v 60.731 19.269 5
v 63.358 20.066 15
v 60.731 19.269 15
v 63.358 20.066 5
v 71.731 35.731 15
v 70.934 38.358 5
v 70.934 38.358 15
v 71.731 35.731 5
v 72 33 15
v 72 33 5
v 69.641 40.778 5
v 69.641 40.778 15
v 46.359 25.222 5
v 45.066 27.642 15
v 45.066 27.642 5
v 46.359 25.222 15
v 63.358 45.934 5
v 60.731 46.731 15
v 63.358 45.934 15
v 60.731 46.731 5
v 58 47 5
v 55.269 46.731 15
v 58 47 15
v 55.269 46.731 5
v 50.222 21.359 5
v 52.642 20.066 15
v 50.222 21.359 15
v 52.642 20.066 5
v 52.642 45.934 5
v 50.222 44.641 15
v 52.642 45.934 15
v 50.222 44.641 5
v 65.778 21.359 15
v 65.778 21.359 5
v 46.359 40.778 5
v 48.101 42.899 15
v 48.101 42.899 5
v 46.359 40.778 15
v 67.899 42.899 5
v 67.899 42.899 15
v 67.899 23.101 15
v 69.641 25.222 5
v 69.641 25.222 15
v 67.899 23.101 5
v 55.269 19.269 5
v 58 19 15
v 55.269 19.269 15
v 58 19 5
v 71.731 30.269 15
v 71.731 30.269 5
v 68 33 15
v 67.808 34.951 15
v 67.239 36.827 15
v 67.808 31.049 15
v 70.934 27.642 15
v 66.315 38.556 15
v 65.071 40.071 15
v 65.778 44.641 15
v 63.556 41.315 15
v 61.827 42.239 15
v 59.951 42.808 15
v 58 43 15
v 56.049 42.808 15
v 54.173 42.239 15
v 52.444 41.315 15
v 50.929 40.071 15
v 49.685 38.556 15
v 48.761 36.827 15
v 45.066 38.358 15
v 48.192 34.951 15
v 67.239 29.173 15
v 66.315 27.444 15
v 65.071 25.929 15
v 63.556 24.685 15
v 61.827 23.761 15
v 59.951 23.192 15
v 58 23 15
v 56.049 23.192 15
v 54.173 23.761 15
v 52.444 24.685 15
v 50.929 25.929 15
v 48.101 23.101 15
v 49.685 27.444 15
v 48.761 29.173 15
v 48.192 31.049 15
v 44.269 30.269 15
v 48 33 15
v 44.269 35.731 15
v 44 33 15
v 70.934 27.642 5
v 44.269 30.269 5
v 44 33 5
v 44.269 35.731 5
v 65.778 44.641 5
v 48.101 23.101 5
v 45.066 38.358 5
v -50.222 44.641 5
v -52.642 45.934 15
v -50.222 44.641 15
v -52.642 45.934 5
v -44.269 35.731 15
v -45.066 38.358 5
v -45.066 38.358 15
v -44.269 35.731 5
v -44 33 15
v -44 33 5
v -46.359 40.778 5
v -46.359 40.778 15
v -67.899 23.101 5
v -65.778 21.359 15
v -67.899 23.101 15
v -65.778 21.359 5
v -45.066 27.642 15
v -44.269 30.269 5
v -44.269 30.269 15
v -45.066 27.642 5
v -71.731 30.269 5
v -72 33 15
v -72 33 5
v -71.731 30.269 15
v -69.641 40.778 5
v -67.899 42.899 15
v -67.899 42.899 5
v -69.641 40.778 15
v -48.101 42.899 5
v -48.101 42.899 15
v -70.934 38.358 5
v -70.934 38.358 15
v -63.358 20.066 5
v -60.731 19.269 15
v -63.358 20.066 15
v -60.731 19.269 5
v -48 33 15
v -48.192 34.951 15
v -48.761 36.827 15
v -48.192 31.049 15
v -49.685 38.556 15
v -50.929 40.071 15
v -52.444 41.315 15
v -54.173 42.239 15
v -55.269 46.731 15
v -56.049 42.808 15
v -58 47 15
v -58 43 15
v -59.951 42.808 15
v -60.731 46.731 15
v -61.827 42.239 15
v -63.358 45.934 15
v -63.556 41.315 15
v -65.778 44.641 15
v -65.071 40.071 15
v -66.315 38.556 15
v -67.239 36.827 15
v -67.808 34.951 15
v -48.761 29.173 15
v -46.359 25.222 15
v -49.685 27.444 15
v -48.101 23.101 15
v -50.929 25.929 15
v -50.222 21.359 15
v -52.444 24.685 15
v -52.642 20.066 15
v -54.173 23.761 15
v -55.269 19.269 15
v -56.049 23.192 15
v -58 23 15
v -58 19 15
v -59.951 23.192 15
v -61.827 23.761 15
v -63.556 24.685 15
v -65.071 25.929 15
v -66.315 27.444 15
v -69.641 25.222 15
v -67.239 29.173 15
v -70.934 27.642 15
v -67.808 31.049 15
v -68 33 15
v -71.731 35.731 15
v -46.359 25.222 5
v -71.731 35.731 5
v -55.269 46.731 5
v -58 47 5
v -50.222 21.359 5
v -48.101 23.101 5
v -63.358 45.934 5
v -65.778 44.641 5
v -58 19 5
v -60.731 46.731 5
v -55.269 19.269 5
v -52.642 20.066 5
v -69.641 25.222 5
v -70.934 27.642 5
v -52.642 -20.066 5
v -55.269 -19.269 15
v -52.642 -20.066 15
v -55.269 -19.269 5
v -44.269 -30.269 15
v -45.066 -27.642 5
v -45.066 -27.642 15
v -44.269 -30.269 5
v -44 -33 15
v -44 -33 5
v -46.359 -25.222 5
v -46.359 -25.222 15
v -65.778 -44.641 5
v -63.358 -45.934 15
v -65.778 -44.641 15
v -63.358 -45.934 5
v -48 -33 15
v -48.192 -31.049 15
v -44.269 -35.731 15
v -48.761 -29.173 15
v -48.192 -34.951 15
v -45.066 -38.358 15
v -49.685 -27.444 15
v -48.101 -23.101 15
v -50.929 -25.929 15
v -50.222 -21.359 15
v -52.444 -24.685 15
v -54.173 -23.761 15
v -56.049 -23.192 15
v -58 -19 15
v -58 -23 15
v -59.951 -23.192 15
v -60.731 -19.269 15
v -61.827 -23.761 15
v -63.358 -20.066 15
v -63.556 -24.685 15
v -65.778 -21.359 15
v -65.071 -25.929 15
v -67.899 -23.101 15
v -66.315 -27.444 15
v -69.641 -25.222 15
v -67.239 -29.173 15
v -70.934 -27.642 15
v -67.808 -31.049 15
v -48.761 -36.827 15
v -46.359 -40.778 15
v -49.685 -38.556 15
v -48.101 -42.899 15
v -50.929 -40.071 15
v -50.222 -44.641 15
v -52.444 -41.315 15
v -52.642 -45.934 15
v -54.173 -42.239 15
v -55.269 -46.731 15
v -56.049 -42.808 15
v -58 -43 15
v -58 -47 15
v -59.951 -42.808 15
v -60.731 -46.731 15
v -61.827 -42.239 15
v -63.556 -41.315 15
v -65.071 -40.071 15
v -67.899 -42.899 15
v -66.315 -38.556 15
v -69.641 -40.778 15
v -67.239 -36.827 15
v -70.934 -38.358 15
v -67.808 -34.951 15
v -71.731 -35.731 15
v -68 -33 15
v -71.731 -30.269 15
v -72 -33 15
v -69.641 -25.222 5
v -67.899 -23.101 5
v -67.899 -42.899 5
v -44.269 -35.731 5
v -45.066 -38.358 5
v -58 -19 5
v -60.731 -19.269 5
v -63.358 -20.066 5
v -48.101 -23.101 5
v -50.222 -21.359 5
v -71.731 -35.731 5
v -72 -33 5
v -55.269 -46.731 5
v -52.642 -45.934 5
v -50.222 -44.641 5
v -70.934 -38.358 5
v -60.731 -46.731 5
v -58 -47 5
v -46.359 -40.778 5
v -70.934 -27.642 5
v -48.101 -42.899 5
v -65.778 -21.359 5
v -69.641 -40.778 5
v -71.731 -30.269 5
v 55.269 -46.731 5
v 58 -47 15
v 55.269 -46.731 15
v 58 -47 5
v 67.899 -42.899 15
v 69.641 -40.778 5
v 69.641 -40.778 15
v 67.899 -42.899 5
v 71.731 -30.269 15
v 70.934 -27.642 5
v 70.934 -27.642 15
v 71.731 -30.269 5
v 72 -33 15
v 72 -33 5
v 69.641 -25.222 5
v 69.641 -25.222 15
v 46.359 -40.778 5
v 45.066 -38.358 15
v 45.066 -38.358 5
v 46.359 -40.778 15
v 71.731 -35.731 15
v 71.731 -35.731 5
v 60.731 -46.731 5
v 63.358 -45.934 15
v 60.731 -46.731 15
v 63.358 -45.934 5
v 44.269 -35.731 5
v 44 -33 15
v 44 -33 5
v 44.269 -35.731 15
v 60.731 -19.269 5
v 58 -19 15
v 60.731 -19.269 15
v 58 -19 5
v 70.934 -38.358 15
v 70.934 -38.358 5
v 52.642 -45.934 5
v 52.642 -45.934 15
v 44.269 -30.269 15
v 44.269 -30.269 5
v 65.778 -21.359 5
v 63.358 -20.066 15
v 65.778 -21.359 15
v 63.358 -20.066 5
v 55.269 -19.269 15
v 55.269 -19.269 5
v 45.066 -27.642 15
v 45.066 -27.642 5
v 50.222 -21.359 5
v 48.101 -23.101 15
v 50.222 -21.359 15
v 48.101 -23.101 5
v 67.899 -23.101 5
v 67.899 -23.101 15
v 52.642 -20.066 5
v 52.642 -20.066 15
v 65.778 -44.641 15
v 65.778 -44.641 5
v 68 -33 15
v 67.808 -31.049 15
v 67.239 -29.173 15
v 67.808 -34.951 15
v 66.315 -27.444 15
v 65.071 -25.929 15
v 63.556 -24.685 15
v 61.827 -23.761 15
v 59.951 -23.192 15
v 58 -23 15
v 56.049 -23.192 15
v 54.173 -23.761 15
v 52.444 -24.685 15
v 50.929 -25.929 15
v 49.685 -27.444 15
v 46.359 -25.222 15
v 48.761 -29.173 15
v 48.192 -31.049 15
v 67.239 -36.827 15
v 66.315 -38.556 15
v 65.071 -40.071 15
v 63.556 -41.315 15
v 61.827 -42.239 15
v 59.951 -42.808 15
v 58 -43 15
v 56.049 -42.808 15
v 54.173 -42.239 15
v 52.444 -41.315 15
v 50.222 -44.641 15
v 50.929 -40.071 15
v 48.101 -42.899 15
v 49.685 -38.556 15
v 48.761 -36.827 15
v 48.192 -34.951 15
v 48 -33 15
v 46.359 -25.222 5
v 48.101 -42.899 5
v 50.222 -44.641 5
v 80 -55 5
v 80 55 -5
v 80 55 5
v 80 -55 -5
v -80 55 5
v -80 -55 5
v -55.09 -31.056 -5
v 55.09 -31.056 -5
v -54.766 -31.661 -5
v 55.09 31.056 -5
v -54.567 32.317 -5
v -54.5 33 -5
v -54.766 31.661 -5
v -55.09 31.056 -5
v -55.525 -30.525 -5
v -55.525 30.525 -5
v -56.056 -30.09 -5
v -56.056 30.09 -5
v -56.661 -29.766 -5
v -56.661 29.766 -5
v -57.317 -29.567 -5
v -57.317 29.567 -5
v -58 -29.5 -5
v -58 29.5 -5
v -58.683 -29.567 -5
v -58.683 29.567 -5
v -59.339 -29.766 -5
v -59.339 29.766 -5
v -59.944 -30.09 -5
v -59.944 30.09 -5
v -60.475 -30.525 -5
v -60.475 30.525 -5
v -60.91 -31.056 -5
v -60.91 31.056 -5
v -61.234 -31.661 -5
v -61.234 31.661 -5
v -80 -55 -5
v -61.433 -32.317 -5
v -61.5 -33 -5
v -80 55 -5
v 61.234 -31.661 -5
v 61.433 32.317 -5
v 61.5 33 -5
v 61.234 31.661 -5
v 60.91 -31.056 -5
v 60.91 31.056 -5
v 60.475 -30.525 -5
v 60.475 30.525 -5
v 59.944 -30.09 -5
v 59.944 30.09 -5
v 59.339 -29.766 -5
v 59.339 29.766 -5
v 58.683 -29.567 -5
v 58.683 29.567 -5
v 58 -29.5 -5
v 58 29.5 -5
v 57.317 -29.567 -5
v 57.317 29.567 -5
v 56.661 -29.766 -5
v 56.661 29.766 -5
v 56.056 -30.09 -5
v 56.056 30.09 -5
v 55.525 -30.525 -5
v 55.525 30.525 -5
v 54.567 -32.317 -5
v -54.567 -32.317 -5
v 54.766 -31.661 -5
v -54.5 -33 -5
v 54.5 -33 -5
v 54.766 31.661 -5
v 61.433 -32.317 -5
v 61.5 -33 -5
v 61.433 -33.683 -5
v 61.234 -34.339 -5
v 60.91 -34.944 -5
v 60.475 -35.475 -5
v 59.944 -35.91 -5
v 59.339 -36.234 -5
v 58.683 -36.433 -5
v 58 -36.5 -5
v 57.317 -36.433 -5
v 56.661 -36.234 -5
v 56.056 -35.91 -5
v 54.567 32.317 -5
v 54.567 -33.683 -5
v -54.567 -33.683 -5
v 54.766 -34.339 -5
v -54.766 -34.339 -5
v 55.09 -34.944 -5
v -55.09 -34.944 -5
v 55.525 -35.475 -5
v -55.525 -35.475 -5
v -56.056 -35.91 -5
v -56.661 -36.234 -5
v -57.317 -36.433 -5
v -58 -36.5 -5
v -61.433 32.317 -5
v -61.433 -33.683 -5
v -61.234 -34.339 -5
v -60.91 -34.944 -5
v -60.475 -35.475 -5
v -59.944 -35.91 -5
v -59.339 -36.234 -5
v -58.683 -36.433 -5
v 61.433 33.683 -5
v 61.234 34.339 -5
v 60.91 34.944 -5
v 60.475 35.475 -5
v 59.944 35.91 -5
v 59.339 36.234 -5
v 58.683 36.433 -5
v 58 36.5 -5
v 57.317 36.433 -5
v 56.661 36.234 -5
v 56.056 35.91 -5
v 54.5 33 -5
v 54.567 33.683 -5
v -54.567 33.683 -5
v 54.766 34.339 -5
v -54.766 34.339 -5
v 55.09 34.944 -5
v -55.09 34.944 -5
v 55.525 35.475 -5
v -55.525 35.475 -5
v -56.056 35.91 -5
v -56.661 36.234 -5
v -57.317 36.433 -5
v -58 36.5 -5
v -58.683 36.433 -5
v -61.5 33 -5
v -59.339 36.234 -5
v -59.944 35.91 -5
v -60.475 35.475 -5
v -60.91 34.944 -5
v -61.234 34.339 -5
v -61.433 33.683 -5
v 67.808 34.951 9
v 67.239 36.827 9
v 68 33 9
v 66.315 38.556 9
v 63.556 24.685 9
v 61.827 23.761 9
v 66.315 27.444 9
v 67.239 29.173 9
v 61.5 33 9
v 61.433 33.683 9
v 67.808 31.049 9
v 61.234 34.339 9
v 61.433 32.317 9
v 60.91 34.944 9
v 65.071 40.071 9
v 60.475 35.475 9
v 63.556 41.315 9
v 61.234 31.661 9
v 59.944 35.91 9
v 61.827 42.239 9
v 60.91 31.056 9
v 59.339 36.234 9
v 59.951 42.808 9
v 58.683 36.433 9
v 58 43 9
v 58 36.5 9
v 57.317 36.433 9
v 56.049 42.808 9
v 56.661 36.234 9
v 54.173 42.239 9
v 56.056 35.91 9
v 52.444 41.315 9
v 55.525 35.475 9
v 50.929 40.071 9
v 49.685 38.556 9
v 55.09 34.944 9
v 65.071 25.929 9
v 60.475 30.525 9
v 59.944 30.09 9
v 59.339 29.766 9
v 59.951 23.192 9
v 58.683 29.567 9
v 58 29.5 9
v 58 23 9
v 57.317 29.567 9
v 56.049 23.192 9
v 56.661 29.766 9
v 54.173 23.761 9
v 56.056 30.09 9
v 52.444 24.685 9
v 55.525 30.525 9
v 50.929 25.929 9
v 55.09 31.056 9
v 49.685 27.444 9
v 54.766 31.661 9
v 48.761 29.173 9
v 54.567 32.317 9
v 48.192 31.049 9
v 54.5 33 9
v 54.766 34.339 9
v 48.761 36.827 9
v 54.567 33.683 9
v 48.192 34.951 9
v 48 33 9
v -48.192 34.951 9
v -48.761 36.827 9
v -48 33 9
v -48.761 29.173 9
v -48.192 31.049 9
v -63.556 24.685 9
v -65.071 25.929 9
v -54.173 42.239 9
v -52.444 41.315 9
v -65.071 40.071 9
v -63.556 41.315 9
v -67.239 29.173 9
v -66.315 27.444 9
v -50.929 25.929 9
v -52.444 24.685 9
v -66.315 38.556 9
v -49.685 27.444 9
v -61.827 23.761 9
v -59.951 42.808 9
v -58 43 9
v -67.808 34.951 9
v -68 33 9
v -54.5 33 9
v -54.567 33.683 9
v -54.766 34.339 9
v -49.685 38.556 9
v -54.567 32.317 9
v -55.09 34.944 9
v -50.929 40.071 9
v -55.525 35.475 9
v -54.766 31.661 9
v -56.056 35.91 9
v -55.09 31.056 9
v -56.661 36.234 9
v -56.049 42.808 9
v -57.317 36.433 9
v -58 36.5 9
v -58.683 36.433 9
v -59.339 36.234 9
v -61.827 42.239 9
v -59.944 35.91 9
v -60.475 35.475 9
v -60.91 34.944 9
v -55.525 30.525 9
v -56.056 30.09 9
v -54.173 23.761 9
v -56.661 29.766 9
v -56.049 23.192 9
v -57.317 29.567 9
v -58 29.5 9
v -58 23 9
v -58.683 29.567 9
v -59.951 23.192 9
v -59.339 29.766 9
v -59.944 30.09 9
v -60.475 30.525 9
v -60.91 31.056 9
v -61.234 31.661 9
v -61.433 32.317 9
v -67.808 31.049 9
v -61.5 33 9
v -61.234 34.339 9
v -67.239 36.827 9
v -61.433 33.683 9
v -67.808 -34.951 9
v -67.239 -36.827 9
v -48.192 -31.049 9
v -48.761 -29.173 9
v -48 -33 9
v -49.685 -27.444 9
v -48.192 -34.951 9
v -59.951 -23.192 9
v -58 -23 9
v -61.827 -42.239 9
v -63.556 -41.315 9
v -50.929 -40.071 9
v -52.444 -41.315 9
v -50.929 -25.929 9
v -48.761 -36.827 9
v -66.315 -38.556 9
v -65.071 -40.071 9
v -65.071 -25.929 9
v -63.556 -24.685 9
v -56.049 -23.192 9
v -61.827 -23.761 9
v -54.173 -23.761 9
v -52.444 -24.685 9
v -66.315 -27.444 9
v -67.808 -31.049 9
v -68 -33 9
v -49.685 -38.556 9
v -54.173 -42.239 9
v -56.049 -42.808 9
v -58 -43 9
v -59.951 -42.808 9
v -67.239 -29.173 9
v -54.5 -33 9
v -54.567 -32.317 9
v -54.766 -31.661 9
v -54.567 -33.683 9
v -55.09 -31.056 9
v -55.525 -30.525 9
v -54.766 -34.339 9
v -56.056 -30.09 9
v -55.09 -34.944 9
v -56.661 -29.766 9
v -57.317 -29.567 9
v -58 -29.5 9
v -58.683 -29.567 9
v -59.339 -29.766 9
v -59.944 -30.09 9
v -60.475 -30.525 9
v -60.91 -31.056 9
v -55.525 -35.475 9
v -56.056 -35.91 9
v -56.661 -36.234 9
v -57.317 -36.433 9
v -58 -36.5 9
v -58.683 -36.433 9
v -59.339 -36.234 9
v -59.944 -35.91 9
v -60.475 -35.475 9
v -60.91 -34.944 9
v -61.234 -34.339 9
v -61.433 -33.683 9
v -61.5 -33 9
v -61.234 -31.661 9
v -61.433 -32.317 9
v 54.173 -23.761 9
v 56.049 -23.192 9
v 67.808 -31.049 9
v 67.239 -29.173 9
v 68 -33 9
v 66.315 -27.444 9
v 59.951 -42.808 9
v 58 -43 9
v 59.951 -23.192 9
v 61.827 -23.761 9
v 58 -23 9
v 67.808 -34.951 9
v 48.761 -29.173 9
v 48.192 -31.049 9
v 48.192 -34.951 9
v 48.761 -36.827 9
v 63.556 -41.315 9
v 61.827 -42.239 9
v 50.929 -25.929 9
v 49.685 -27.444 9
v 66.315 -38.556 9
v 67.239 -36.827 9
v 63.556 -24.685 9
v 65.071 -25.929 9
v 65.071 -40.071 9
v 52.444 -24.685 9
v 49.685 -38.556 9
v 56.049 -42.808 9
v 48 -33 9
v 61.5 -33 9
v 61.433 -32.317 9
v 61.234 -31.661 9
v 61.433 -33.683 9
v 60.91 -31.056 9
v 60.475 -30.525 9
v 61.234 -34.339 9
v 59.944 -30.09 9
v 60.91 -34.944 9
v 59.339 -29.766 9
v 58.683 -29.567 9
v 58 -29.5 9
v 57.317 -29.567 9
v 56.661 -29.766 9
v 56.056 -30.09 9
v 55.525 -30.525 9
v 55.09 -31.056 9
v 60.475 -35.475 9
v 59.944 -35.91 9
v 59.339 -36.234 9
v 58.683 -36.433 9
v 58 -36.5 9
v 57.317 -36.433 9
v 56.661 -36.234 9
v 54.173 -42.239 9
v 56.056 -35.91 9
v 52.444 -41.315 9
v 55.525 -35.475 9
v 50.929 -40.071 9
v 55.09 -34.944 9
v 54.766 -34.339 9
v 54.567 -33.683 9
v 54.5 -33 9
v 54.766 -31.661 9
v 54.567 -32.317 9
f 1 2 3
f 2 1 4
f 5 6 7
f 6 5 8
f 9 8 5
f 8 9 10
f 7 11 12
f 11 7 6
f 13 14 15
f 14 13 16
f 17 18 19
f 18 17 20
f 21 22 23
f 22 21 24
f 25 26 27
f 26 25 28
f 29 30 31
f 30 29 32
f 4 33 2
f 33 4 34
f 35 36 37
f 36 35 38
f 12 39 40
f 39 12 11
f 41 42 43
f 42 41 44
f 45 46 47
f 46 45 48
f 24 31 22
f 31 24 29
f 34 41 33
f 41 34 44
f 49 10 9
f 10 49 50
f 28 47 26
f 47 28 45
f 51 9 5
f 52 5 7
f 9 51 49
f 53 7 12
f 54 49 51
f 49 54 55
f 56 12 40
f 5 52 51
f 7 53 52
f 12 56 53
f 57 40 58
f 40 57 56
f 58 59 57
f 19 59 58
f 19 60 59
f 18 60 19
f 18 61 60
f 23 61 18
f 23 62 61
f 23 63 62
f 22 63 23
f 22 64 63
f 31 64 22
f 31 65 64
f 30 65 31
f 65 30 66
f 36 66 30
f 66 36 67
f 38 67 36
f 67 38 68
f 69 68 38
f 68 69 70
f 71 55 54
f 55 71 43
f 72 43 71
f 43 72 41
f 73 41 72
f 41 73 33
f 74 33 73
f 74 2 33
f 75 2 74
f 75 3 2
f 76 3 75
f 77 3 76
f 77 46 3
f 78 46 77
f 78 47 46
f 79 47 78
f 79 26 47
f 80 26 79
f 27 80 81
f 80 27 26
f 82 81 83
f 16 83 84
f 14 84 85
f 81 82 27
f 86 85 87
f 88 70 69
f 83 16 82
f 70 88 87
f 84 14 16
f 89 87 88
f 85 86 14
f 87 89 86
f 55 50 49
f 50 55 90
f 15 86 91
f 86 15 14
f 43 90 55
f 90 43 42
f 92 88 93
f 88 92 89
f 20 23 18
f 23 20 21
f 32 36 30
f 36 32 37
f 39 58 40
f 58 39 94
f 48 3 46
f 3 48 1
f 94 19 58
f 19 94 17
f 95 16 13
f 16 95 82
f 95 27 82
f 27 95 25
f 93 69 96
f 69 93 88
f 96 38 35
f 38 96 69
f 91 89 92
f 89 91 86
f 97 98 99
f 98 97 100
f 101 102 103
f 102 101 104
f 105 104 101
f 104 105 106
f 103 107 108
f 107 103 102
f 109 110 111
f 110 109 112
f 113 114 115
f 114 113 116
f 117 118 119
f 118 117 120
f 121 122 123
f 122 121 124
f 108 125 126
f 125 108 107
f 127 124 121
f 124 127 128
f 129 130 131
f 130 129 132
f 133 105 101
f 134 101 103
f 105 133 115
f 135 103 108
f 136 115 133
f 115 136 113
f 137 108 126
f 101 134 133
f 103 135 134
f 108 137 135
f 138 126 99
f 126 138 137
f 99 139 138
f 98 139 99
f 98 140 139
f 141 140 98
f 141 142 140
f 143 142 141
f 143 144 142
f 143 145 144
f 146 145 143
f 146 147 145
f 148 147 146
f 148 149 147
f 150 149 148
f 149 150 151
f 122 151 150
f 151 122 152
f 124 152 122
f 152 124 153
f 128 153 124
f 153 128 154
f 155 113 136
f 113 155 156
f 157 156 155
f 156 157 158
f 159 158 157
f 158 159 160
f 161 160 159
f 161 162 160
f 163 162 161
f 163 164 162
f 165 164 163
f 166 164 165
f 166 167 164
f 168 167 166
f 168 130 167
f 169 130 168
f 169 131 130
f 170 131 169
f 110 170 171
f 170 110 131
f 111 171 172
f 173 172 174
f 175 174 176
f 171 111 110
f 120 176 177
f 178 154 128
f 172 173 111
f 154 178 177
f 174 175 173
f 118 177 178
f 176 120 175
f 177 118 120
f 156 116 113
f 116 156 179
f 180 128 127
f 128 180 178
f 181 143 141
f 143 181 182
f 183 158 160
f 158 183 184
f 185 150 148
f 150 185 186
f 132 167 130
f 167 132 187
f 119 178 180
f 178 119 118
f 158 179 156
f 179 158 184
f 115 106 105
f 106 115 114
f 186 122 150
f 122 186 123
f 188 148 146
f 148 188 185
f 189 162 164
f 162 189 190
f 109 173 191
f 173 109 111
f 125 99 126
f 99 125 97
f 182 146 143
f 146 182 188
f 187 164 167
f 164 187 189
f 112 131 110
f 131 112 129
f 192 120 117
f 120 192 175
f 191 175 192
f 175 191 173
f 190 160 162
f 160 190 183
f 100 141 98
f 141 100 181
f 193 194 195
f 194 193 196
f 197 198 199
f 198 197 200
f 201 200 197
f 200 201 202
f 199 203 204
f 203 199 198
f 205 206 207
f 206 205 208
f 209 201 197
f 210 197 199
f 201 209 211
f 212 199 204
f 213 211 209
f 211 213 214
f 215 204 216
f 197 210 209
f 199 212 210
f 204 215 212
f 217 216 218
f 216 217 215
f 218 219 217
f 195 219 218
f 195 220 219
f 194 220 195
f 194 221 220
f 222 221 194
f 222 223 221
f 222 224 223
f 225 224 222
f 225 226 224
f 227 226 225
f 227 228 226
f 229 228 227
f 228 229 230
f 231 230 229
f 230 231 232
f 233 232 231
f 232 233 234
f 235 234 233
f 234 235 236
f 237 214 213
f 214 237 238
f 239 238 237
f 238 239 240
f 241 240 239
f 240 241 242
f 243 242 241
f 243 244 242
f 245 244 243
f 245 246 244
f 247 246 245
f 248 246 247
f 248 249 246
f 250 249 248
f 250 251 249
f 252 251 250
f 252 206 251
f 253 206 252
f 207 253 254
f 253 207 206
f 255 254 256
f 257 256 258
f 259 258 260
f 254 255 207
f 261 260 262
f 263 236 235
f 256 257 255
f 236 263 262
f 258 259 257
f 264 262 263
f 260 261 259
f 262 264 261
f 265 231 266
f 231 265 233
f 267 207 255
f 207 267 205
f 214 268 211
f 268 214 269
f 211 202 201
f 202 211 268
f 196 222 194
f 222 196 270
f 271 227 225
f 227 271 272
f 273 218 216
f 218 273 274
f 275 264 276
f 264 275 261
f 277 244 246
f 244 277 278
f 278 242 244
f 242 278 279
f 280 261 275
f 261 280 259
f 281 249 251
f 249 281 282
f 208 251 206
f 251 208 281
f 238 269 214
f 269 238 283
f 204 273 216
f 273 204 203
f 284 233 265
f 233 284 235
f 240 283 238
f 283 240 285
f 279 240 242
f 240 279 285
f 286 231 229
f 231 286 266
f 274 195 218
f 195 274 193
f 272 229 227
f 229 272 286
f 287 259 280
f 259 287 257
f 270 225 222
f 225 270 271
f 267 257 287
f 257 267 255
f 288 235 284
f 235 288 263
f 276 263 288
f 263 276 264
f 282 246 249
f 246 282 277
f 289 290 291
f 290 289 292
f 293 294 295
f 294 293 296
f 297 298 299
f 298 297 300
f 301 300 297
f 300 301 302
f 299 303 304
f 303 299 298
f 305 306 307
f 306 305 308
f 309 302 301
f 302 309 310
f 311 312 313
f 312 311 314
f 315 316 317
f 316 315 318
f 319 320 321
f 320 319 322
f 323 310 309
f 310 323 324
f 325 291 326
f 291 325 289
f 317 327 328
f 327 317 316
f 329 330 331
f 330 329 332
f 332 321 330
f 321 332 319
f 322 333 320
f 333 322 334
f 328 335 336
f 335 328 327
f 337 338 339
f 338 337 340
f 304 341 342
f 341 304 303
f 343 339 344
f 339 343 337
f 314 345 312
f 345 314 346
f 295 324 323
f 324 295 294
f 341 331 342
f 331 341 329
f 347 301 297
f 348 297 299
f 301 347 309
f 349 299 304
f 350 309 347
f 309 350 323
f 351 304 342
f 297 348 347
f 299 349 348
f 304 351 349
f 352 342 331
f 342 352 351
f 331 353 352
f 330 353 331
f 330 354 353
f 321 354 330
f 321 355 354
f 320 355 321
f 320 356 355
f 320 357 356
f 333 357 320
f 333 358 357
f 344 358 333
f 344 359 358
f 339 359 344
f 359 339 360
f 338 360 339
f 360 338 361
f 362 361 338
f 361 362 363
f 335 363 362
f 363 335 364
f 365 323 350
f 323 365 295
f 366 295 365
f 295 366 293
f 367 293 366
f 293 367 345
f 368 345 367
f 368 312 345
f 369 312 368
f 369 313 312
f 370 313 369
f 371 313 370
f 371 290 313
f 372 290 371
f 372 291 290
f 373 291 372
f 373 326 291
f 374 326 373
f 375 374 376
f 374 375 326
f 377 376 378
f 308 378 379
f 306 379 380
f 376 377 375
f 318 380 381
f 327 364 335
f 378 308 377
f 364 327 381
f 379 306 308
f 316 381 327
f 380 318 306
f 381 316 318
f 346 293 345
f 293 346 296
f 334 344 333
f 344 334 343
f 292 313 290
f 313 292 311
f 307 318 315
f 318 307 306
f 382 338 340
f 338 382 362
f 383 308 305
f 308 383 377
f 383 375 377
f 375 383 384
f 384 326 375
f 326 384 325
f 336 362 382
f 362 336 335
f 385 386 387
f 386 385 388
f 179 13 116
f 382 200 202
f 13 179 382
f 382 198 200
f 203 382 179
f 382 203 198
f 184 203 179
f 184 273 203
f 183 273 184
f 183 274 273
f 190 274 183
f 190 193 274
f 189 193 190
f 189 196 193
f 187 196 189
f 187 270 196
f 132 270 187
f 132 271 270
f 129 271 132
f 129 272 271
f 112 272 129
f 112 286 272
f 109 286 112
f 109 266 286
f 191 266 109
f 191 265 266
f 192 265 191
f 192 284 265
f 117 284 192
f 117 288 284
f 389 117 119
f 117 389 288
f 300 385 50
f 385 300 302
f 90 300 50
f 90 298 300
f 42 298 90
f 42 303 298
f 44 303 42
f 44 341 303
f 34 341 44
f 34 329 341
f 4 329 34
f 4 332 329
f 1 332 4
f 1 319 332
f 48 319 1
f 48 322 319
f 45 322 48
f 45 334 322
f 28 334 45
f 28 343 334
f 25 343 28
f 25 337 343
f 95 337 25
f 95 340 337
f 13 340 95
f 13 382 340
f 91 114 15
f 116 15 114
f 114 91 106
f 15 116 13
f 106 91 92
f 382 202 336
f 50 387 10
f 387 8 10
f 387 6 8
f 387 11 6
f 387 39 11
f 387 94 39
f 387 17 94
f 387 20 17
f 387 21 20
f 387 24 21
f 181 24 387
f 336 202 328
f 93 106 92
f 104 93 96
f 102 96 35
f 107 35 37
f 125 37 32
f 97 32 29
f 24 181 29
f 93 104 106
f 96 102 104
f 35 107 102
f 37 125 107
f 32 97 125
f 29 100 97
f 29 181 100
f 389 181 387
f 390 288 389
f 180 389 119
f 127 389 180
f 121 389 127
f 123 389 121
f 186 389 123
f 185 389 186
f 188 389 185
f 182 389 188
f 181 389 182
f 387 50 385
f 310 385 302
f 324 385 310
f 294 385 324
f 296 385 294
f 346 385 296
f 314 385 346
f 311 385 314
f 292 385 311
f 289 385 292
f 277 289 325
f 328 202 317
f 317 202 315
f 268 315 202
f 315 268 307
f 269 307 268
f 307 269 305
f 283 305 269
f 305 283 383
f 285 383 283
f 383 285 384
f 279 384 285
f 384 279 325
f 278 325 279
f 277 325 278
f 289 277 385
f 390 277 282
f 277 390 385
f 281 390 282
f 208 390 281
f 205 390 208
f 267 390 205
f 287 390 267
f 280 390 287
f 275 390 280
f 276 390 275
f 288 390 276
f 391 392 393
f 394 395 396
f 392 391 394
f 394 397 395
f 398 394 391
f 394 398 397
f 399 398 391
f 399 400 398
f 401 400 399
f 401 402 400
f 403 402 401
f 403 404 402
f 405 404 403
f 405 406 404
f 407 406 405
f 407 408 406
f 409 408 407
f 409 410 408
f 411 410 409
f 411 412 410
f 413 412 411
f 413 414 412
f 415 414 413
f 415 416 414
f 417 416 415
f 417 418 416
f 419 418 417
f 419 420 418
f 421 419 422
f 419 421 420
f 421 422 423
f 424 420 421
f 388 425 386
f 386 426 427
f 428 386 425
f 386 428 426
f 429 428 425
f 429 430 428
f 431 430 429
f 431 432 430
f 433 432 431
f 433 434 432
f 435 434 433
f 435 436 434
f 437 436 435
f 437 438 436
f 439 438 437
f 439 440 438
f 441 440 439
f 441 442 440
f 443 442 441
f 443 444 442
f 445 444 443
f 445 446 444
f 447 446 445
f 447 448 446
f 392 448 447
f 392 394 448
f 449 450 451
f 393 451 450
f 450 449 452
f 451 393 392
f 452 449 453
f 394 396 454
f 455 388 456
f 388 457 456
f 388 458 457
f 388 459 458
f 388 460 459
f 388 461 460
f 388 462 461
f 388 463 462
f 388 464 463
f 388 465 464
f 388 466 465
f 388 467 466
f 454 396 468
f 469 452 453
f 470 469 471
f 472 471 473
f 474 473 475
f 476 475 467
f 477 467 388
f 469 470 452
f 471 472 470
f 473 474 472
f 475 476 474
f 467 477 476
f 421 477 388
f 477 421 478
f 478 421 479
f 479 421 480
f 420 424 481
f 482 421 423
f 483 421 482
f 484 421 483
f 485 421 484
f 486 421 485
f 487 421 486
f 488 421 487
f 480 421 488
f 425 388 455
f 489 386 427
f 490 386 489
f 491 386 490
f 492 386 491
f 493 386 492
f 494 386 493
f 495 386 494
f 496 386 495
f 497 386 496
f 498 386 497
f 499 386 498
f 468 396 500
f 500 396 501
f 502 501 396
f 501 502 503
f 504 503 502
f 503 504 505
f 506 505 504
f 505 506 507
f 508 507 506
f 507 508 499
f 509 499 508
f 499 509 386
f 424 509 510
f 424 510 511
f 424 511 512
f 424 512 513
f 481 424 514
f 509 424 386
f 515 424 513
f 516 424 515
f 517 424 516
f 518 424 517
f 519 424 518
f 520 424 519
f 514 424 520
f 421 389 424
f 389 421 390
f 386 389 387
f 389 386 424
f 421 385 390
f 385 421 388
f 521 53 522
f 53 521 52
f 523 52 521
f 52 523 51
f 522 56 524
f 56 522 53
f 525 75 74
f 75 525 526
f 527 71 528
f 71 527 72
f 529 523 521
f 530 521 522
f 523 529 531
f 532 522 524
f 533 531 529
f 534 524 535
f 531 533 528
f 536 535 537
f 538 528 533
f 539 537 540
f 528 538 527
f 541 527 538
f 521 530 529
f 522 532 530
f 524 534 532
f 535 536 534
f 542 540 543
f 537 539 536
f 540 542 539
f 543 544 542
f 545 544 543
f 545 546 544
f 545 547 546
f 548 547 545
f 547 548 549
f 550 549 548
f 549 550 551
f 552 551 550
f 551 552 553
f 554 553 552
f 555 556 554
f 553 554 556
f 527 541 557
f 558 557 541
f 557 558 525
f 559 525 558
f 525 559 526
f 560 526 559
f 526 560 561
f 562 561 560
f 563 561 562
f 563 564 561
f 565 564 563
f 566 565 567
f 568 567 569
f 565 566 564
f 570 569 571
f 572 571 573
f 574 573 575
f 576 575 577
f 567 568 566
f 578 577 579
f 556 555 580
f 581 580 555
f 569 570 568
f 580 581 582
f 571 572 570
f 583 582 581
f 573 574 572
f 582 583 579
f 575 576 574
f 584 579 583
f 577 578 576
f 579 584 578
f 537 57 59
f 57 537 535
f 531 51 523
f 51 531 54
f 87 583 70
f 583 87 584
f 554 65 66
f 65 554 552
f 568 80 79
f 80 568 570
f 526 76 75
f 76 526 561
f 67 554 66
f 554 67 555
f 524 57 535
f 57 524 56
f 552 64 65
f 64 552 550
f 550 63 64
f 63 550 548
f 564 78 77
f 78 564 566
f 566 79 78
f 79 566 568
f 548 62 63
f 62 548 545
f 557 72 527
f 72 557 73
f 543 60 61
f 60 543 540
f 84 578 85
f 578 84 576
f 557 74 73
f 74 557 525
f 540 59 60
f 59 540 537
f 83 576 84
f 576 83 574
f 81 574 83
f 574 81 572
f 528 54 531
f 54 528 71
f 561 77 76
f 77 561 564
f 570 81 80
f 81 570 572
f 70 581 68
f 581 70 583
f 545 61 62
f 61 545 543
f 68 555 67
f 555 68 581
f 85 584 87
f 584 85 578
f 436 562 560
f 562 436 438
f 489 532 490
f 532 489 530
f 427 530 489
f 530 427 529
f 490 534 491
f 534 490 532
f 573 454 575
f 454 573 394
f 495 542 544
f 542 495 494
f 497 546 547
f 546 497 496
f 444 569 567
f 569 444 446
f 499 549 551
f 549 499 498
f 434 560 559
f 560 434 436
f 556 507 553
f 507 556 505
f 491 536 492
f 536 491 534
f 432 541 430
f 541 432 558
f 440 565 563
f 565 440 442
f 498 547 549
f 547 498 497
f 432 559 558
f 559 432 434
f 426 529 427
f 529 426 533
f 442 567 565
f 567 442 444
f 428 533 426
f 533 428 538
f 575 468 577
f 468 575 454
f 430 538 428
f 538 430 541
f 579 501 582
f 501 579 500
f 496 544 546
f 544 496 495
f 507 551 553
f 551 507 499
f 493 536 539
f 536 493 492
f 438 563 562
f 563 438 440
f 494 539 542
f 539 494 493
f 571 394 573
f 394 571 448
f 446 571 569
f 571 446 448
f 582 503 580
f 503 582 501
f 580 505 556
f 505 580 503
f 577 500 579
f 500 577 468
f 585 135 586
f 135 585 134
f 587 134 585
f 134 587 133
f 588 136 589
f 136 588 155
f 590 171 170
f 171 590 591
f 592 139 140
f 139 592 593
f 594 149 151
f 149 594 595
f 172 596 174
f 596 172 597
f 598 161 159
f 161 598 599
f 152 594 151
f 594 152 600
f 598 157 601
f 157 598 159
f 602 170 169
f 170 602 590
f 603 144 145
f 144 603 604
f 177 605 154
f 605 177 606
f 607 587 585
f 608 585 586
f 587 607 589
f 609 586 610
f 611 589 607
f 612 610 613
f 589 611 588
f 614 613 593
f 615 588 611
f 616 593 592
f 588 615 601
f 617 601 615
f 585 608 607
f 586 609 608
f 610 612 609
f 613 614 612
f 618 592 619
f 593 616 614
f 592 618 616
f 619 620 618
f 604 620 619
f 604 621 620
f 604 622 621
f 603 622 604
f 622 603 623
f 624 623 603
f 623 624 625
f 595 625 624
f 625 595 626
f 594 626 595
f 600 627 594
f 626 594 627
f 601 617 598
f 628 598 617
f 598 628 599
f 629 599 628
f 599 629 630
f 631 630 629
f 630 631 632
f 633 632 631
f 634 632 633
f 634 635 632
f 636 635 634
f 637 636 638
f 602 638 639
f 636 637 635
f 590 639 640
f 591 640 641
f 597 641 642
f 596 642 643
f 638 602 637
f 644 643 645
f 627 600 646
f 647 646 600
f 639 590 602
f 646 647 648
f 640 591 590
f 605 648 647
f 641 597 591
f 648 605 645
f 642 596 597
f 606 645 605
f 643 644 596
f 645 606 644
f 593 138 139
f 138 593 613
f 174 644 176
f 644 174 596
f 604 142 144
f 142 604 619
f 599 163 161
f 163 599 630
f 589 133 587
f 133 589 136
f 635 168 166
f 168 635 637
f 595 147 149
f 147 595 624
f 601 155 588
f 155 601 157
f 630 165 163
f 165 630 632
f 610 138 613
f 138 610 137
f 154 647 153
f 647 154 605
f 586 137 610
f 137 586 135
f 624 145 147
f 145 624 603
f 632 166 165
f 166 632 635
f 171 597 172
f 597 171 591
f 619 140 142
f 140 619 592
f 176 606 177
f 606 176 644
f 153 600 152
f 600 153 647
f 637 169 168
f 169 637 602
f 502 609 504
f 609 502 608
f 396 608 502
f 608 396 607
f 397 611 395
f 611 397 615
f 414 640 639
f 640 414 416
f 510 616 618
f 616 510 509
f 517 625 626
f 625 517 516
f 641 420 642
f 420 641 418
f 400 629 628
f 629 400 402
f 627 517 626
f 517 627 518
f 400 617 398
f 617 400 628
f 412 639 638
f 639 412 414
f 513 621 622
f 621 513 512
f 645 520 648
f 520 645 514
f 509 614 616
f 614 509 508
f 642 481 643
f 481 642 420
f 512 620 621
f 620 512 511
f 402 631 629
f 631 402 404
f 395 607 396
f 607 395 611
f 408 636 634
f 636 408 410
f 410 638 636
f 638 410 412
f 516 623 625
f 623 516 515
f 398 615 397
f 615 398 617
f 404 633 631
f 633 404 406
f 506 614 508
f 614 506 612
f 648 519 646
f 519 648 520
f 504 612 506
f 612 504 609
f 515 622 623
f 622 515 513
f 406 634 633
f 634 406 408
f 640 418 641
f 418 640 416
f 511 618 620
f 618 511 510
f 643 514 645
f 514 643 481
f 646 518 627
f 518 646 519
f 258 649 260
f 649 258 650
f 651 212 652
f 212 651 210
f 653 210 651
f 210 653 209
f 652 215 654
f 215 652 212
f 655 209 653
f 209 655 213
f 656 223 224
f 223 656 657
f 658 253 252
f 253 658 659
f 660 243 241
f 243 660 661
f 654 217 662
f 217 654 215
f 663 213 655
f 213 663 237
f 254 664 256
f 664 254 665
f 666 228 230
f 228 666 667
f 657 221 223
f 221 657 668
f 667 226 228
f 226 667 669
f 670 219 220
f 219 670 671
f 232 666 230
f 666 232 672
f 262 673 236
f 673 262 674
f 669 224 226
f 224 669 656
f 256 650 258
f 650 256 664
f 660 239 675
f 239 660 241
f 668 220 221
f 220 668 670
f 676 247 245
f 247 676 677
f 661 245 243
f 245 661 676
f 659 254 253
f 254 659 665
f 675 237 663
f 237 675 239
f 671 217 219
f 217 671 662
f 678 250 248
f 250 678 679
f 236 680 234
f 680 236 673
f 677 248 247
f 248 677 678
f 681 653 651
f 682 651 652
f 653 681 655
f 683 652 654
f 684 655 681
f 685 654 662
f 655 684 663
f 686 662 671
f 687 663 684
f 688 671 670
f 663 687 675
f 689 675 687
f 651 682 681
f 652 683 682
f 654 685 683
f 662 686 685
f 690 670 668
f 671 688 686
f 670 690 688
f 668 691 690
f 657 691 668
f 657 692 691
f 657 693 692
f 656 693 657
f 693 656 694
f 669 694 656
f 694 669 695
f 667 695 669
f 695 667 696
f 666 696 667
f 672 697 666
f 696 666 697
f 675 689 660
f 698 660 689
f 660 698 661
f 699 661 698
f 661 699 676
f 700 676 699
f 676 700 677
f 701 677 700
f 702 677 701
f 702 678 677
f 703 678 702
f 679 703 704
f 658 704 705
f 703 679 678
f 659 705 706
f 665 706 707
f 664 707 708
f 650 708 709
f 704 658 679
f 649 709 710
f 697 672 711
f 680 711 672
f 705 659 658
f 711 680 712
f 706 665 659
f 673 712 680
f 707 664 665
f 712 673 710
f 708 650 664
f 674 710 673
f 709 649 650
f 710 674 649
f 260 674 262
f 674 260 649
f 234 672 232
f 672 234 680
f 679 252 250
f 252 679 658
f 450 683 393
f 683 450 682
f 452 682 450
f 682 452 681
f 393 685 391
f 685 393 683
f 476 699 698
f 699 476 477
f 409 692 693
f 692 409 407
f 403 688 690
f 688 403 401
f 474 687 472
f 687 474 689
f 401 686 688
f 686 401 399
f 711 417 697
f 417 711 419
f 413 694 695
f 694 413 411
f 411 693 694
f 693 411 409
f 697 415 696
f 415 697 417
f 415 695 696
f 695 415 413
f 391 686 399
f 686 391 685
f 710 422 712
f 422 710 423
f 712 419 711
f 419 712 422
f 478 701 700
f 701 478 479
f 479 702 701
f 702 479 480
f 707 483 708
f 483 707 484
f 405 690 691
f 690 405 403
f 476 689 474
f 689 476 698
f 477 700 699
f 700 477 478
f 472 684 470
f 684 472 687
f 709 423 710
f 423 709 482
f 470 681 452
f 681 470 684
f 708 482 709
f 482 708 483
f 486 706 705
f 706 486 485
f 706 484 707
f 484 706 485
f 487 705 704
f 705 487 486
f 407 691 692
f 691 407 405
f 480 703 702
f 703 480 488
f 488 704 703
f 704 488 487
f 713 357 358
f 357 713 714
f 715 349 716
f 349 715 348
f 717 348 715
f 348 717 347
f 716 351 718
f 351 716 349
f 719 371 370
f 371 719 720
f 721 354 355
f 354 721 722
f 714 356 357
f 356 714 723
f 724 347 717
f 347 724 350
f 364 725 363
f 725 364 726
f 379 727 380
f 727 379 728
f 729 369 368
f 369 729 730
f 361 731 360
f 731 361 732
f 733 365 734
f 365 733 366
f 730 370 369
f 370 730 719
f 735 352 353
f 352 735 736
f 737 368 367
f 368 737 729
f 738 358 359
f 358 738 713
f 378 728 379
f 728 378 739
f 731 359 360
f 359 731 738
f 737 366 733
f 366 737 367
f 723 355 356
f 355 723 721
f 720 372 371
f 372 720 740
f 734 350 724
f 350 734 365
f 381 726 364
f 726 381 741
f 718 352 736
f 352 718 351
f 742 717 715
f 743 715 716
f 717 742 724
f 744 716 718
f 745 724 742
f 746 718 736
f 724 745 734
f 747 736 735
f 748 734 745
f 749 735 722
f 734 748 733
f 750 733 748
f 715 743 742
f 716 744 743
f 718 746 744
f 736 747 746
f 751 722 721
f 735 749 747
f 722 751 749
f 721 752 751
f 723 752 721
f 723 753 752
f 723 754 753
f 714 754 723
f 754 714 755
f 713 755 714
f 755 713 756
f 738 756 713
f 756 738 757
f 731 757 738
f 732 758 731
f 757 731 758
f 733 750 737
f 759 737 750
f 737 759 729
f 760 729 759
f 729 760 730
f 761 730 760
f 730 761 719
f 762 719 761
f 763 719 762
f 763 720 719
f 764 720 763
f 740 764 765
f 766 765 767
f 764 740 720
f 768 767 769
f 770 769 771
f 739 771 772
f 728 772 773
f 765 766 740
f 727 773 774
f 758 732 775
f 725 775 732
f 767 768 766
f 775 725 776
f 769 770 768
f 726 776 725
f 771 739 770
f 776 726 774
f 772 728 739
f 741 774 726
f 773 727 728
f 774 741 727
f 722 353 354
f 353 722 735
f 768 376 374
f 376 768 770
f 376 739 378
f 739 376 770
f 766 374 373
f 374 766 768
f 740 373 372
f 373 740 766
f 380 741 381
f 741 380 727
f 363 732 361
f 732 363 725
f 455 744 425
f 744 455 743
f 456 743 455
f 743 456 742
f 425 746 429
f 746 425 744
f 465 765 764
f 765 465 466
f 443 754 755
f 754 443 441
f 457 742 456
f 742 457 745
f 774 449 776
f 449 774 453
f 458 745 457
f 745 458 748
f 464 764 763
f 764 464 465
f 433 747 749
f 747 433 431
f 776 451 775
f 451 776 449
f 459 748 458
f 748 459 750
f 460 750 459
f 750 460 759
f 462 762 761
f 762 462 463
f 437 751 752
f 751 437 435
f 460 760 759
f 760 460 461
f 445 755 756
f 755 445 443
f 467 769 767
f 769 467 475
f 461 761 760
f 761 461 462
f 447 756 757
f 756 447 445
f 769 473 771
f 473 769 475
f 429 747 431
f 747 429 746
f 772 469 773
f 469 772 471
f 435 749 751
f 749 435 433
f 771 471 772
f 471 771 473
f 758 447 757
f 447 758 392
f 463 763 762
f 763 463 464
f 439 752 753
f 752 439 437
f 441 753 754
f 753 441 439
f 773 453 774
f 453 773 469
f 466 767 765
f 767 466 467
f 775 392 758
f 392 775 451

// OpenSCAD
$fn = 32;

// ----------------------------------------------------------------------
// Socket pad plate
// bosses with counterbored sockets for the screws
// ----------------------------------------------------------------------

// --- parameters (mm) ---
base_t = 10;             // base plate thickness
boss_h = 10;             // boss height above the base plate
boss_d = 28;             // boss diameter
socket_d = 20;           // socket diameter
socket_depth = 6;        // socket depth from the boss face
bolt_d = 7;              // screw clearance hole through the socket floor
plate = [160, 110, 10];  // overall size (x, y, z)
edge = 22;               // boss centre offset from the plate edge
pads = 4;                // boss count, one per corner

// --- derived feature positions (mm) ---
height = base_t + boss_h;        // = 20   overall height of the part
corner_x = plate[0] / 2 - edge;  // = 58   boss centre X
corner_y = plate[1] / 2 - edge;  // = 33   boss centre Y
feature_centers = [
  [corner_x, corner_y],
  [-corner_x, corner_y],
  [-corner_x, -corner_y],
  [corner_x, -corner_y]
];   // boss centres: sockets, holes and the pads themselves are placed from here

// base plate, bosses on feature_centers, socket + through hole in each
difference() {
  union() {
    cube(plate, center = true);
    for (centre = feature_centers)
      translate([centre[0], centre[1], plate[2] / 2 - 1])
        cylinder(d = boss_d, h = boss_h + 1);
  }
  for (centre = feature_centers) {
    translate([centre[0], centre[1], plate[2] / 2 + boss_h - socket_depth])
      cylinder(d = socket_d, h = socket_depth + 1);
    translate([centre[0], centre[1], -height])
      cylinder(d = bolt_d, h = 2 * height + 2);  // through the socket floor
  }
}
